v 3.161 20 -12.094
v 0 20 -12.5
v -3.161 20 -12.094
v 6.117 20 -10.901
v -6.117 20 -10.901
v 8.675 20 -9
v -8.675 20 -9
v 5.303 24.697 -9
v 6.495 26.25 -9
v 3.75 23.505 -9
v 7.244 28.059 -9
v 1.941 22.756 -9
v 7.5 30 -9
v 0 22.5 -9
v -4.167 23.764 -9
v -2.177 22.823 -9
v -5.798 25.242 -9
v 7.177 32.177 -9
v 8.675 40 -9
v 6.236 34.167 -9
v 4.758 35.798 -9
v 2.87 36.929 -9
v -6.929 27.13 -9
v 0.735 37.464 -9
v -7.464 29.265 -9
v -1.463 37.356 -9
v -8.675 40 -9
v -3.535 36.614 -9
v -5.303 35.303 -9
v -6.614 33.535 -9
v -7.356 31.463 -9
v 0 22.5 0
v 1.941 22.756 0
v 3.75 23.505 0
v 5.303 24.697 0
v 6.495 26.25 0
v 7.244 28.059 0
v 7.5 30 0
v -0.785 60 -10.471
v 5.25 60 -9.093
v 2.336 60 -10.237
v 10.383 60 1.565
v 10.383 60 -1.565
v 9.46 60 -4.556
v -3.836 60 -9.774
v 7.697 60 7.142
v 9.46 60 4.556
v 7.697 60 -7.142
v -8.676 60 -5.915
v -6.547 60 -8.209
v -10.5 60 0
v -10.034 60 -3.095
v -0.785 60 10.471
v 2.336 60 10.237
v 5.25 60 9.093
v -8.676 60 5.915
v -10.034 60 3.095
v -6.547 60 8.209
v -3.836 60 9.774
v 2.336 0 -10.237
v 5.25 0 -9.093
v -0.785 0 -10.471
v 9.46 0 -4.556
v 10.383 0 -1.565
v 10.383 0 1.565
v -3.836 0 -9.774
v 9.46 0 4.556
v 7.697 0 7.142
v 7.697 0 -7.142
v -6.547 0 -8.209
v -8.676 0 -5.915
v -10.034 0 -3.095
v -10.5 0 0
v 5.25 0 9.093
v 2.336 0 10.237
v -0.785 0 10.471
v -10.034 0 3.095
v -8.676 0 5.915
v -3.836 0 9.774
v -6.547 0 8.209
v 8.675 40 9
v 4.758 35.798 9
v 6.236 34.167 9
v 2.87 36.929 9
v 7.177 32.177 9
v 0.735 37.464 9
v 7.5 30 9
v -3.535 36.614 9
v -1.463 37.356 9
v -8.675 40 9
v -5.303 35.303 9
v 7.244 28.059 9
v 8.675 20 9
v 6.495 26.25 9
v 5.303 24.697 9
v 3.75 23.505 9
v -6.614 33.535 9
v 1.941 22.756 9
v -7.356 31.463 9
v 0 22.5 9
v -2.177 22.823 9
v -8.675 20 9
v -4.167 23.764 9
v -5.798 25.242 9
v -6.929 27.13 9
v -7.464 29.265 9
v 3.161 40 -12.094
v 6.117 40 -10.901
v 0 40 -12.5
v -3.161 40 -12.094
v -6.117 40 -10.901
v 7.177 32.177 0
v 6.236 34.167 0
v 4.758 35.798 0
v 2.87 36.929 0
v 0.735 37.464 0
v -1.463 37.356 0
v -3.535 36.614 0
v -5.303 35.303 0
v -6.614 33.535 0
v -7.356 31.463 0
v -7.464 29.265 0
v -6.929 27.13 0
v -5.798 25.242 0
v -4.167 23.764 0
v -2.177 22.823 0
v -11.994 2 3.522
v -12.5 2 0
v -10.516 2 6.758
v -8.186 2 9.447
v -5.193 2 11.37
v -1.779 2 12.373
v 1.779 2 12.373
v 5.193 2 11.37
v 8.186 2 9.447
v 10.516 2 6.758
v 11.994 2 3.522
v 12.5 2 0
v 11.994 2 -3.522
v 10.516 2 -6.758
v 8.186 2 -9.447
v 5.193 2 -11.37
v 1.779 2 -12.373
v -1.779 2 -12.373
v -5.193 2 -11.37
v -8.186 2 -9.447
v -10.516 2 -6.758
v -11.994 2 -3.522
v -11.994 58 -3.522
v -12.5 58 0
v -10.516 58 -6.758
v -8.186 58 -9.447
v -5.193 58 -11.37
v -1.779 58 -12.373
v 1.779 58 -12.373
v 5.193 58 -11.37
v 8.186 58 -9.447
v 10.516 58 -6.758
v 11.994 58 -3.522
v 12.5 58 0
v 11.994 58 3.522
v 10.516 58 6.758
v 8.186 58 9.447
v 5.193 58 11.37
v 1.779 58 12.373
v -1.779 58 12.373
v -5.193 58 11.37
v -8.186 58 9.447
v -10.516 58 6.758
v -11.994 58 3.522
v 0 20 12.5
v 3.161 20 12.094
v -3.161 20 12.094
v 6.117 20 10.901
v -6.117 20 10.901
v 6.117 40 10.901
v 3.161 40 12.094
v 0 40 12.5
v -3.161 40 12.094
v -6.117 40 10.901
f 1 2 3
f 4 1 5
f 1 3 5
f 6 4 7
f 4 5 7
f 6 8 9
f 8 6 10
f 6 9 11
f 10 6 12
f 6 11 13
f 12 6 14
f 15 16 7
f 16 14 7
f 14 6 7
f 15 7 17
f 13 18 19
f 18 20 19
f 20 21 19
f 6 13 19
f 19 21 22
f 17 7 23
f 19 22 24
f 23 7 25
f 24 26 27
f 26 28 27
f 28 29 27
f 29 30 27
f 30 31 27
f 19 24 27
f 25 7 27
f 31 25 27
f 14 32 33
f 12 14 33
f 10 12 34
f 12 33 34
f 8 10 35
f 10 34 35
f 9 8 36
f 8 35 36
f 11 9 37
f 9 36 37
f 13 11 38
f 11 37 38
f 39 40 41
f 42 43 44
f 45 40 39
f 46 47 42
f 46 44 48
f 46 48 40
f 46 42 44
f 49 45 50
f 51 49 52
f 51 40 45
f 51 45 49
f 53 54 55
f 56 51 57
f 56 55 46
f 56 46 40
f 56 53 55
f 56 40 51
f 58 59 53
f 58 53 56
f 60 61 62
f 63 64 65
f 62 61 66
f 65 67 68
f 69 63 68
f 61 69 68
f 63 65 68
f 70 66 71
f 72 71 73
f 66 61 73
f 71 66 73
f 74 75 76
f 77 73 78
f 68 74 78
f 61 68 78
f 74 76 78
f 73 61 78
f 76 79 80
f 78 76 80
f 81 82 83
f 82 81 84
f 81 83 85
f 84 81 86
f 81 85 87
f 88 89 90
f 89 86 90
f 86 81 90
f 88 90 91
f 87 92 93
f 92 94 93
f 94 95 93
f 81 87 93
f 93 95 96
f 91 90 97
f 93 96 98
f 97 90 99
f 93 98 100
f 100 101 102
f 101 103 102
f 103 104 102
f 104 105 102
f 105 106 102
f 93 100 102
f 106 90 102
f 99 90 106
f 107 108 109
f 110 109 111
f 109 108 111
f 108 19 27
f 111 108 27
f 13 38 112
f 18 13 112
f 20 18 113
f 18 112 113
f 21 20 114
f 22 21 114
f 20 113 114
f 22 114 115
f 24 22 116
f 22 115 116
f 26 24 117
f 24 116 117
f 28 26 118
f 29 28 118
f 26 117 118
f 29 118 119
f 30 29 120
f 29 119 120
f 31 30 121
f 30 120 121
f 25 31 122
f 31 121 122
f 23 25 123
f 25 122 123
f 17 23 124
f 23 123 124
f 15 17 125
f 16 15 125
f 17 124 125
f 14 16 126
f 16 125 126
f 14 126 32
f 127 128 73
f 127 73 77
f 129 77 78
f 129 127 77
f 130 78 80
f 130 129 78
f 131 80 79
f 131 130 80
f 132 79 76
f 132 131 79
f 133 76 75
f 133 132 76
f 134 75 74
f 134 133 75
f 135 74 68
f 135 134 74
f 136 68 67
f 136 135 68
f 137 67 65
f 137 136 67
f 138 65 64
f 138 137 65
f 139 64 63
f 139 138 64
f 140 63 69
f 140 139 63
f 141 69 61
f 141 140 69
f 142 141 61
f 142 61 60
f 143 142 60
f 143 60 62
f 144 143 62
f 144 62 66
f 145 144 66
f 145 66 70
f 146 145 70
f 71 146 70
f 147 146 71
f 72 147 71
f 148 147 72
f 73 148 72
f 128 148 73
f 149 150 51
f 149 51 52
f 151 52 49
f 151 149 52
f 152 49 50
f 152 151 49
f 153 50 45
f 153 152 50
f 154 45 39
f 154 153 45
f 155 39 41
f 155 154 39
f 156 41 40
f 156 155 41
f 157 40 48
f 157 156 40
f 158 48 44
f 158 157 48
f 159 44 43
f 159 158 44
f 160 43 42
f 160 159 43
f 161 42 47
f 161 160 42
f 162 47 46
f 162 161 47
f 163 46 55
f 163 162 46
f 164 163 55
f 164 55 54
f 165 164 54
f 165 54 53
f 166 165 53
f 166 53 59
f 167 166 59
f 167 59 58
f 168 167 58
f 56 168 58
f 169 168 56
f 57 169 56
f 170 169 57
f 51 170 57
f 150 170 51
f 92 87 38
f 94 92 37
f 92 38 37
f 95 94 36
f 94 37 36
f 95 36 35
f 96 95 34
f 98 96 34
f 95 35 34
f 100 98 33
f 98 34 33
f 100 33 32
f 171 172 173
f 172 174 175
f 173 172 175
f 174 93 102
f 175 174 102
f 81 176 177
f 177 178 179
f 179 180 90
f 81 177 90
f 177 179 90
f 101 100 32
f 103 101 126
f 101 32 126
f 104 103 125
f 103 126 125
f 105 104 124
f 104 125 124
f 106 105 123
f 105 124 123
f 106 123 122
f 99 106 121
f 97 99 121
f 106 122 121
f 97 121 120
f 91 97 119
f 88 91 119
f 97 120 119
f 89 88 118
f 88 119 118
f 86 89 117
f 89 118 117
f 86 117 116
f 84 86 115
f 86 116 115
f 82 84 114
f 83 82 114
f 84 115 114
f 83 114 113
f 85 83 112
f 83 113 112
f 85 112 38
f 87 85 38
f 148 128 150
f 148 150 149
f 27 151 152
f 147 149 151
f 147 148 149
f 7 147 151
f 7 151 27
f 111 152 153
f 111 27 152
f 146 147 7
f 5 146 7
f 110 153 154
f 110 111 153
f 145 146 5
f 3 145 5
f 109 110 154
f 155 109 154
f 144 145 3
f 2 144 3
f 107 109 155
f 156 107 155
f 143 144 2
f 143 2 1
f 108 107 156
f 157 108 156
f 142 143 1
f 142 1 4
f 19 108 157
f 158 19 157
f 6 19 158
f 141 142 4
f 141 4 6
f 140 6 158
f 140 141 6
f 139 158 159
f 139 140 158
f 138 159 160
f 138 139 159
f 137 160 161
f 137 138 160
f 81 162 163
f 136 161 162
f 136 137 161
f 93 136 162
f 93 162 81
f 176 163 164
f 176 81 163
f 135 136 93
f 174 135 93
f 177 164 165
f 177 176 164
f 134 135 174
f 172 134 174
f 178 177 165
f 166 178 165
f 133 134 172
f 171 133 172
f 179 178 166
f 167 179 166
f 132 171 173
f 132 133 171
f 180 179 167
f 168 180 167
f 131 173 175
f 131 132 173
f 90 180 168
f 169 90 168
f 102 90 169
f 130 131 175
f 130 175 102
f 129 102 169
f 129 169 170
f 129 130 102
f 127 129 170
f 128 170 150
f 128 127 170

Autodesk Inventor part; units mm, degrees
ref_plane "YZ Plane" through (0, 0, 0) normal (1, 0, 0) x (0, 1, 0)
ref_plane "XZ Plane" through (0, 0, 0) normal (0, 1, 0) x (-1, 0, 0)
ref_plane "XY Plane" through (0, 0, 0) normal (0, 0, 1) x (1, 0, 0)
sketch "Sketch1" plane through (0, 0, 0) normal (0, 1, 0) x (-1, 0, 0)
  circle A0 centre (0, 0) radius 12.5
  dimension "d0" = 25
extrude "Extrusion1" add sketch "Sketch1" along normal blind 60
sketch "Sketch2" plane through (0, 0, 0) normal (0, 0, 1) x (1, 0, 0)
  line L0 (0, 0) -> (0, 30)
  circle A0 centre (0, 30) radius 7.5
  dimension "d3" = 30
  dimension "d4" = 15
extrude "Extrusion2" cut sketch "Sketch2" along normal mid plane 60
chamfer "Chamfer1" distance 2 angle 45 2 edges at (12.5, 60, 0) (12.5, 0, 0)
sketch "Sketch3" plane through (0, 0, 0) normal (1, 0, 0) x (0, 1, 0)
  line L0 (0, 0) -> (20, 0)
  line L1 (20, 0) -> (20, -9)
  line L2 (2, -12.5) -> (58, -12.5) projected
  line L3 (20, -9) -> (40, -9)
  line L4 (40, -9) -> (40, 9)
  line L5 (40, 9) -> (20, 9)
  line L6 (20, 9) -> (20, 0)
  line L7 (40, -9) -> (40, -15.8527)
  line L8 (40, -15.8527) -> (20, -15.8527)
  line L9 (20, -15.8527) -> (20, -9)
  line L10 (20, 9) -> (20, 19.7516)
  line L11 (20, 19.7516) -> (40, 19.7516)
  line L12 (40, 19.7516) -> (40, 9)
  dimension "d20" = 20
  dimension "d21" = 9
  dimension "d22" = 20
  dimension "d23" = 18
extrude "Extrusion3" cut sketch "Sketch3" along normal mid plane 25 contours L3 L7 L2 L9 | L10 L11 L12 L5 | L2 L7 L8 L9
properties part number "Pino Plataforma Deslizante"
